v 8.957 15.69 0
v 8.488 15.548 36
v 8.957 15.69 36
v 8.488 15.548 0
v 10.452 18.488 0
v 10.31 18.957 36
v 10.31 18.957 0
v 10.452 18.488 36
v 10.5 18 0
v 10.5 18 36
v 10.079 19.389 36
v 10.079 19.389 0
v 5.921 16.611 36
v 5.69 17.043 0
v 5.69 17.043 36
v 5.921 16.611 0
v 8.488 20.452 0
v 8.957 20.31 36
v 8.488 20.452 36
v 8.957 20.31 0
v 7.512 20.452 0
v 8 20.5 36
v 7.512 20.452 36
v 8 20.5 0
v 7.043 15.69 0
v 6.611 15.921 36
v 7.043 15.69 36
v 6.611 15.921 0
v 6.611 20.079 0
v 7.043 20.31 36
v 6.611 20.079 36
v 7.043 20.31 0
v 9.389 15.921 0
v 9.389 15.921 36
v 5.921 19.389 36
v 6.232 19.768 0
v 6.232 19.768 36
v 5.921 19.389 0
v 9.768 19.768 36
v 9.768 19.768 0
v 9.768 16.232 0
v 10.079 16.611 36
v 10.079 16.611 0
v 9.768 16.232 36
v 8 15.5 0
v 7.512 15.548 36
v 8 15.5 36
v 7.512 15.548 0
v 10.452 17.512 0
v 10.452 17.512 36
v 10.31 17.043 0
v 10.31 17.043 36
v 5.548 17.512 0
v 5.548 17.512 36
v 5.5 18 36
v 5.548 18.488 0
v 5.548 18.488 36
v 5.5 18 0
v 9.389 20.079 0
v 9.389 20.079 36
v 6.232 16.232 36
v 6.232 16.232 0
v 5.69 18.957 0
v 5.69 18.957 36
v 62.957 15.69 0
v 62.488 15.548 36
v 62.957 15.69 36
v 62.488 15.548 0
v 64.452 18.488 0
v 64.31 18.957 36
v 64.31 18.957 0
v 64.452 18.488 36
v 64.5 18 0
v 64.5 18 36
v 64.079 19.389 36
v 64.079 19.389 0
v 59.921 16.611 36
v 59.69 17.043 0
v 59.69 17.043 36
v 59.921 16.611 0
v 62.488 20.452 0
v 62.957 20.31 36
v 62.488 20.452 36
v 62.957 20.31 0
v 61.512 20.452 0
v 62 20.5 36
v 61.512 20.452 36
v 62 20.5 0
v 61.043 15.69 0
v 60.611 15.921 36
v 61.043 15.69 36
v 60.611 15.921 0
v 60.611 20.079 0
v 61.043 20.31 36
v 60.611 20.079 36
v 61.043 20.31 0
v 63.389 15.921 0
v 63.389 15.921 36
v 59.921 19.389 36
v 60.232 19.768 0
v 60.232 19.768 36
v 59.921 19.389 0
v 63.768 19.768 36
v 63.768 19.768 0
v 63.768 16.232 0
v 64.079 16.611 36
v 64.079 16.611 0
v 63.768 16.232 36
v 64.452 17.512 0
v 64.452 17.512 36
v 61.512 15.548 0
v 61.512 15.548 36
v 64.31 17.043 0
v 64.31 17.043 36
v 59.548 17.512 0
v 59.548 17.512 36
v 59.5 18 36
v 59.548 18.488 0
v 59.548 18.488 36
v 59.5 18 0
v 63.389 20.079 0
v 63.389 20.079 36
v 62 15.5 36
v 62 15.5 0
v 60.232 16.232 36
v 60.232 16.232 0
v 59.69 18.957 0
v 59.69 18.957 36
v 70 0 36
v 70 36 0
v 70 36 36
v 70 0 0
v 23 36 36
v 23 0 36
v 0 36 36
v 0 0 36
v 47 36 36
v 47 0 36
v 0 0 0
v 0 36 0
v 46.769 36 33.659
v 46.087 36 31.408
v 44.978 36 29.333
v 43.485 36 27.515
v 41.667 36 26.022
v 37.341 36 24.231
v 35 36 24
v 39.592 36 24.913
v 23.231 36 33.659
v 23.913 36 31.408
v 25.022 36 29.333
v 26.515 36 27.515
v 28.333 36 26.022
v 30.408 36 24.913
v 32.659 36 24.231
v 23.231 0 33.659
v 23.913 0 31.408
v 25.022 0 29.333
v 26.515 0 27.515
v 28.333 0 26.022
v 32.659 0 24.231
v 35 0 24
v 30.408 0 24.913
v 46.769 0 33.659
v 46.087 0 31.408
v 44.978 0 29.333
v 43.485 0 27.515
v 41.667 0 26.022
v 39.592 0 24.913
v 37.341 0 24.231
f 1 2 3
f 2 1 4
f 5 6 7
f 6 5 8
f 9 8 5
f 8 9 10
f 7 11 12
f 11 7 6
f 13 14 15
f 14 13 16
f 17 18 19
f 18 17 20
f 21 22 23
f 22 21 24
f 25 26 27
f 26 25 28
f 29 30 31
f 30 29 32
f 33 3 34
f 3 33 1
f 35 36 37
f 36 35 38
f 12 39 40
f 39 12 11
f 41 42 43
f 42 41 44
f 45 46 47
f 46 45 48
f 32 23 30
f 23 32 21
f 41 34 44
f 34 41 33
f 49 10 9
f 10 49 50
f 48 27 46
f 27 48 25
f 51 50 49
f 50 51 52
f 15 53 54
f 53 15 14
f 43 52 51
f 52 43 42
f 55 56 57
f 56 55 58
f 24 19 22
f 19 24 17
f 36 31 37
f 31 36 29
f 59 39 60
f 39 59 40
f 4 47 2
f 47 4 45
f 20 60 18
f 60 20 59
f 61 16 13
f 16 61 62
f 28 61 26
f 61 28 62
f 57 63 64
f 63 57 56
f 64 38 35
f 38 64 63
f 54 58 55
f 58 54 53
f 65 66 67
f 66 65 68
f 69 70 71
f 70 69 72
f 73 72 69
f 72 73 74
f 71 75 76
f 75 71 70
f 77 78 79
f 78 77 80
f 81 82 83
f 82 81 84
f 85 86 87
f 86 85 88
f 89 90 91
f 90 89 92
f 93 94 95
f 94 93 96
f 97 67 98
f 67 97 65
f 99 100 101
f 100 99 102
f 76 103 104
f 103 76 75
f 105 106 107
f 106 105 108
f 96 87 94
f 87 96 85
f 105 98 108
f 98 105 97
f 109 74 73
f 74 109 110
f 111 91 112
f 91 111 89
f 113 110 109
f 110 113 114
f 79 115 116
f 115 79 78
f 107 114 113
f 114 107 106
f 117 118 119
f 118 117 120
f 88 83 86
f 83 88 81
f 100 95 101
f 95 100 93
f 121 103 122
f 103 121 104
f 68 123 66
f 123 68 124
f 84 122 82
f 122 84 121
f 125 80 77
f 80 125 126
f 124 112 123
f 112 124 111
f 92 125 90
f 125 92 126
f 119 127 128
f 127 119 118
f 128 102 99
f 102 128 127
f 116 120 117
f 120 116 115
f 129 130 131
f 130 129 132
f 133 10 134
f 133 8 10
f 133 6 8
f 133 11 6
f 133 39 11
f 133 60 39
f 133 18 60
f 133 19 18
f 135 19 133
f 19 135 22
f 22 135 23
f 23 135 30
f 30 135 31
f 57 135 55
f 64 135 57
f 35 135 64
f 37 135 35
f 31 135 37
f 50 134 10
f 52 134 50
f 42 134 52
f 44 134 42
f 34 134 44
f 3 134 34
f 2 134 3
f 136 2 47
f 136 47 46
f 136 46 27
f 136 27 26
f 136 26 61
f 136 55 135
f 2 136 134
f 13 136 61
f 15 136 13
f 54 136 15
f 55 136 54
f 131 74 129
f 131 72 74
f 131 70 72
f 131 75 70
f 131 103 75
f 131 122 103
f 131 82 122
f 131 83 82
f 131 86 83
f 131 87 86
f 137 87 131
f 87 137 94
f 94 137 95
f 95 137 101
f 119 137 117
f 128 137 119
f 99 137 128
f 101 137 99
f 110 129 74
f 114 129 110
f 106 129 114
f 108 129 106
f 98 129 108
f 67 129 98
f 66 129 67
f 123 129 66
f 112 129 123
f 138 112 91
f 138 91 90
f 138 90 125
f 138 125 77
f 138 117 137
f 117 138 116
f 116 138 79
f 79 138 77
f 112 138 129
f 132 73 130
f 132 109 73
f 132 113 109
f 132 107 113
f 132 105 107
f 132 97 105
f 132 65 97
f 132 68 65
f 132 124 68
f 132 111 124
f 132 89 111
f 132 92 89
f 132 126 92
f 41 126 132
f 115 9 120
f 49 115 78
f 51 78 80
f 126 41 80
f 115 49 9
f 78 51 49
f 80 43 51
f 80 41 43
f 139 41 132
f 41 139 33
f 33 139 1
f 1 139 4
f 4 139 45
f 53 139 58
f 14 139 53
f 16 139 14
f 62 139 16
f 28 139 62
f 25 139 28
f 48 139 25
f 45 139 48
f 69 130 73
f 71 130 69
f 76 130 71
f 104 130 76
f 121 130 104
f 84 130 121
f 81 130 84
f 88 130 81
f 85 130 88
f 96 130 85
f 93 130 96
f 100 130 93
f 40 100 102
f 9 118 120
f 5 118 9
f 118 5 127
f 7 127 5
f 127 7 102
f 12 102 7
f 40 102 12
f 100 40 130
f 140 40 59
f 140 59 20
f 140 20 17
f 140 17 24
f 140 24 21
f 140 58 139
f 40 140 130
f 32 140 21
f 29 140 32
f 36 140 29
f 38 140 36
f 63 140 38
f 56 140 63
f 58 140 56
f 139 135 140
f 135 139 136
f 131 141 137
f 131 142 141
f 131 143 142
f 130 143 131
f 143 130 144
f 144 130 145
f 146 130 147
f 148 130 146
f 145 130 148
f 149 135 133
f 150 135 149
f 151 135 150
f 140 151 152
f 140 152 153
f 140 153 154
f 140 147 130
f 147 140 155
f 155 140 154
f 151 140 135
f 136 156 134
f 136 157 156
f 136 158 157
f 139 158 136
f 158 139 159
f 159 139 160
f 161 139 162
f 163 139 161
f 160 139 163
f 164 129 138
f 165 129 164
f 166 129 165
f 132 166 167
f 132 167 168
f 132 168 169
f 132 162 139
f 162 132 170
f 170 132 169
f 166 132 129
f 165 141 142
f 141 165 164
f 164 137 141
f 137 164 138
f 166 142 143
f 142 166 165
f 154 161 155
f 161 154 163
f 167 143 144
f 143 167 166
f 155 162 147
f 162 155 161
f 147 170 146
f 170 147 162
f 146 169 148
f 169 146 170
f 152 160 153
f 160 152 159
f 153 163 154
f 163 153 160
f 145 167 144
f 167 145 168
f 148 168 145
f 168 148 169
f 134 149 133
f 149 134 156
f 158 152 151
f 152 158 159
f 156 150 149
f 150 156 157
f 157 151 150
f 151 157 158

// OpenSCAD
$fn = 32;
// target_bbox: 70, 36, 36
// ----------------------------------------------------------------------
// Saddle clamp: plain shaft clamp
// ----------------------------------------------------------------------

// --- parameters (mm) ---
blk_l = 70;               // block length, X
blk_w = 36;               // block width, Y
blk_h = 36;               // block height
clamp_r = 12;             // shaft groove radius
hole_r = 2.5;             // bolt hole radius
hole_m = 8;               // bolt hole margin from the ends

saw_depth = clamp_r + 3;  // saw kerf depth

difference() {
  cube([blk_l, blk_w, blk_h]);
  translate([blk_l / 2, -1, blk_h])
    rotate([-90, 0, 0])
      cylinder(h = blk_w + 2, r = clamp_r);
  for (sx = [0, 1])
    translate([sx ? blk_l - hole_m : hole_m, blk_w / 2, -1])
      cylinder(r = hole_r, h = blk_h + 2);
}
